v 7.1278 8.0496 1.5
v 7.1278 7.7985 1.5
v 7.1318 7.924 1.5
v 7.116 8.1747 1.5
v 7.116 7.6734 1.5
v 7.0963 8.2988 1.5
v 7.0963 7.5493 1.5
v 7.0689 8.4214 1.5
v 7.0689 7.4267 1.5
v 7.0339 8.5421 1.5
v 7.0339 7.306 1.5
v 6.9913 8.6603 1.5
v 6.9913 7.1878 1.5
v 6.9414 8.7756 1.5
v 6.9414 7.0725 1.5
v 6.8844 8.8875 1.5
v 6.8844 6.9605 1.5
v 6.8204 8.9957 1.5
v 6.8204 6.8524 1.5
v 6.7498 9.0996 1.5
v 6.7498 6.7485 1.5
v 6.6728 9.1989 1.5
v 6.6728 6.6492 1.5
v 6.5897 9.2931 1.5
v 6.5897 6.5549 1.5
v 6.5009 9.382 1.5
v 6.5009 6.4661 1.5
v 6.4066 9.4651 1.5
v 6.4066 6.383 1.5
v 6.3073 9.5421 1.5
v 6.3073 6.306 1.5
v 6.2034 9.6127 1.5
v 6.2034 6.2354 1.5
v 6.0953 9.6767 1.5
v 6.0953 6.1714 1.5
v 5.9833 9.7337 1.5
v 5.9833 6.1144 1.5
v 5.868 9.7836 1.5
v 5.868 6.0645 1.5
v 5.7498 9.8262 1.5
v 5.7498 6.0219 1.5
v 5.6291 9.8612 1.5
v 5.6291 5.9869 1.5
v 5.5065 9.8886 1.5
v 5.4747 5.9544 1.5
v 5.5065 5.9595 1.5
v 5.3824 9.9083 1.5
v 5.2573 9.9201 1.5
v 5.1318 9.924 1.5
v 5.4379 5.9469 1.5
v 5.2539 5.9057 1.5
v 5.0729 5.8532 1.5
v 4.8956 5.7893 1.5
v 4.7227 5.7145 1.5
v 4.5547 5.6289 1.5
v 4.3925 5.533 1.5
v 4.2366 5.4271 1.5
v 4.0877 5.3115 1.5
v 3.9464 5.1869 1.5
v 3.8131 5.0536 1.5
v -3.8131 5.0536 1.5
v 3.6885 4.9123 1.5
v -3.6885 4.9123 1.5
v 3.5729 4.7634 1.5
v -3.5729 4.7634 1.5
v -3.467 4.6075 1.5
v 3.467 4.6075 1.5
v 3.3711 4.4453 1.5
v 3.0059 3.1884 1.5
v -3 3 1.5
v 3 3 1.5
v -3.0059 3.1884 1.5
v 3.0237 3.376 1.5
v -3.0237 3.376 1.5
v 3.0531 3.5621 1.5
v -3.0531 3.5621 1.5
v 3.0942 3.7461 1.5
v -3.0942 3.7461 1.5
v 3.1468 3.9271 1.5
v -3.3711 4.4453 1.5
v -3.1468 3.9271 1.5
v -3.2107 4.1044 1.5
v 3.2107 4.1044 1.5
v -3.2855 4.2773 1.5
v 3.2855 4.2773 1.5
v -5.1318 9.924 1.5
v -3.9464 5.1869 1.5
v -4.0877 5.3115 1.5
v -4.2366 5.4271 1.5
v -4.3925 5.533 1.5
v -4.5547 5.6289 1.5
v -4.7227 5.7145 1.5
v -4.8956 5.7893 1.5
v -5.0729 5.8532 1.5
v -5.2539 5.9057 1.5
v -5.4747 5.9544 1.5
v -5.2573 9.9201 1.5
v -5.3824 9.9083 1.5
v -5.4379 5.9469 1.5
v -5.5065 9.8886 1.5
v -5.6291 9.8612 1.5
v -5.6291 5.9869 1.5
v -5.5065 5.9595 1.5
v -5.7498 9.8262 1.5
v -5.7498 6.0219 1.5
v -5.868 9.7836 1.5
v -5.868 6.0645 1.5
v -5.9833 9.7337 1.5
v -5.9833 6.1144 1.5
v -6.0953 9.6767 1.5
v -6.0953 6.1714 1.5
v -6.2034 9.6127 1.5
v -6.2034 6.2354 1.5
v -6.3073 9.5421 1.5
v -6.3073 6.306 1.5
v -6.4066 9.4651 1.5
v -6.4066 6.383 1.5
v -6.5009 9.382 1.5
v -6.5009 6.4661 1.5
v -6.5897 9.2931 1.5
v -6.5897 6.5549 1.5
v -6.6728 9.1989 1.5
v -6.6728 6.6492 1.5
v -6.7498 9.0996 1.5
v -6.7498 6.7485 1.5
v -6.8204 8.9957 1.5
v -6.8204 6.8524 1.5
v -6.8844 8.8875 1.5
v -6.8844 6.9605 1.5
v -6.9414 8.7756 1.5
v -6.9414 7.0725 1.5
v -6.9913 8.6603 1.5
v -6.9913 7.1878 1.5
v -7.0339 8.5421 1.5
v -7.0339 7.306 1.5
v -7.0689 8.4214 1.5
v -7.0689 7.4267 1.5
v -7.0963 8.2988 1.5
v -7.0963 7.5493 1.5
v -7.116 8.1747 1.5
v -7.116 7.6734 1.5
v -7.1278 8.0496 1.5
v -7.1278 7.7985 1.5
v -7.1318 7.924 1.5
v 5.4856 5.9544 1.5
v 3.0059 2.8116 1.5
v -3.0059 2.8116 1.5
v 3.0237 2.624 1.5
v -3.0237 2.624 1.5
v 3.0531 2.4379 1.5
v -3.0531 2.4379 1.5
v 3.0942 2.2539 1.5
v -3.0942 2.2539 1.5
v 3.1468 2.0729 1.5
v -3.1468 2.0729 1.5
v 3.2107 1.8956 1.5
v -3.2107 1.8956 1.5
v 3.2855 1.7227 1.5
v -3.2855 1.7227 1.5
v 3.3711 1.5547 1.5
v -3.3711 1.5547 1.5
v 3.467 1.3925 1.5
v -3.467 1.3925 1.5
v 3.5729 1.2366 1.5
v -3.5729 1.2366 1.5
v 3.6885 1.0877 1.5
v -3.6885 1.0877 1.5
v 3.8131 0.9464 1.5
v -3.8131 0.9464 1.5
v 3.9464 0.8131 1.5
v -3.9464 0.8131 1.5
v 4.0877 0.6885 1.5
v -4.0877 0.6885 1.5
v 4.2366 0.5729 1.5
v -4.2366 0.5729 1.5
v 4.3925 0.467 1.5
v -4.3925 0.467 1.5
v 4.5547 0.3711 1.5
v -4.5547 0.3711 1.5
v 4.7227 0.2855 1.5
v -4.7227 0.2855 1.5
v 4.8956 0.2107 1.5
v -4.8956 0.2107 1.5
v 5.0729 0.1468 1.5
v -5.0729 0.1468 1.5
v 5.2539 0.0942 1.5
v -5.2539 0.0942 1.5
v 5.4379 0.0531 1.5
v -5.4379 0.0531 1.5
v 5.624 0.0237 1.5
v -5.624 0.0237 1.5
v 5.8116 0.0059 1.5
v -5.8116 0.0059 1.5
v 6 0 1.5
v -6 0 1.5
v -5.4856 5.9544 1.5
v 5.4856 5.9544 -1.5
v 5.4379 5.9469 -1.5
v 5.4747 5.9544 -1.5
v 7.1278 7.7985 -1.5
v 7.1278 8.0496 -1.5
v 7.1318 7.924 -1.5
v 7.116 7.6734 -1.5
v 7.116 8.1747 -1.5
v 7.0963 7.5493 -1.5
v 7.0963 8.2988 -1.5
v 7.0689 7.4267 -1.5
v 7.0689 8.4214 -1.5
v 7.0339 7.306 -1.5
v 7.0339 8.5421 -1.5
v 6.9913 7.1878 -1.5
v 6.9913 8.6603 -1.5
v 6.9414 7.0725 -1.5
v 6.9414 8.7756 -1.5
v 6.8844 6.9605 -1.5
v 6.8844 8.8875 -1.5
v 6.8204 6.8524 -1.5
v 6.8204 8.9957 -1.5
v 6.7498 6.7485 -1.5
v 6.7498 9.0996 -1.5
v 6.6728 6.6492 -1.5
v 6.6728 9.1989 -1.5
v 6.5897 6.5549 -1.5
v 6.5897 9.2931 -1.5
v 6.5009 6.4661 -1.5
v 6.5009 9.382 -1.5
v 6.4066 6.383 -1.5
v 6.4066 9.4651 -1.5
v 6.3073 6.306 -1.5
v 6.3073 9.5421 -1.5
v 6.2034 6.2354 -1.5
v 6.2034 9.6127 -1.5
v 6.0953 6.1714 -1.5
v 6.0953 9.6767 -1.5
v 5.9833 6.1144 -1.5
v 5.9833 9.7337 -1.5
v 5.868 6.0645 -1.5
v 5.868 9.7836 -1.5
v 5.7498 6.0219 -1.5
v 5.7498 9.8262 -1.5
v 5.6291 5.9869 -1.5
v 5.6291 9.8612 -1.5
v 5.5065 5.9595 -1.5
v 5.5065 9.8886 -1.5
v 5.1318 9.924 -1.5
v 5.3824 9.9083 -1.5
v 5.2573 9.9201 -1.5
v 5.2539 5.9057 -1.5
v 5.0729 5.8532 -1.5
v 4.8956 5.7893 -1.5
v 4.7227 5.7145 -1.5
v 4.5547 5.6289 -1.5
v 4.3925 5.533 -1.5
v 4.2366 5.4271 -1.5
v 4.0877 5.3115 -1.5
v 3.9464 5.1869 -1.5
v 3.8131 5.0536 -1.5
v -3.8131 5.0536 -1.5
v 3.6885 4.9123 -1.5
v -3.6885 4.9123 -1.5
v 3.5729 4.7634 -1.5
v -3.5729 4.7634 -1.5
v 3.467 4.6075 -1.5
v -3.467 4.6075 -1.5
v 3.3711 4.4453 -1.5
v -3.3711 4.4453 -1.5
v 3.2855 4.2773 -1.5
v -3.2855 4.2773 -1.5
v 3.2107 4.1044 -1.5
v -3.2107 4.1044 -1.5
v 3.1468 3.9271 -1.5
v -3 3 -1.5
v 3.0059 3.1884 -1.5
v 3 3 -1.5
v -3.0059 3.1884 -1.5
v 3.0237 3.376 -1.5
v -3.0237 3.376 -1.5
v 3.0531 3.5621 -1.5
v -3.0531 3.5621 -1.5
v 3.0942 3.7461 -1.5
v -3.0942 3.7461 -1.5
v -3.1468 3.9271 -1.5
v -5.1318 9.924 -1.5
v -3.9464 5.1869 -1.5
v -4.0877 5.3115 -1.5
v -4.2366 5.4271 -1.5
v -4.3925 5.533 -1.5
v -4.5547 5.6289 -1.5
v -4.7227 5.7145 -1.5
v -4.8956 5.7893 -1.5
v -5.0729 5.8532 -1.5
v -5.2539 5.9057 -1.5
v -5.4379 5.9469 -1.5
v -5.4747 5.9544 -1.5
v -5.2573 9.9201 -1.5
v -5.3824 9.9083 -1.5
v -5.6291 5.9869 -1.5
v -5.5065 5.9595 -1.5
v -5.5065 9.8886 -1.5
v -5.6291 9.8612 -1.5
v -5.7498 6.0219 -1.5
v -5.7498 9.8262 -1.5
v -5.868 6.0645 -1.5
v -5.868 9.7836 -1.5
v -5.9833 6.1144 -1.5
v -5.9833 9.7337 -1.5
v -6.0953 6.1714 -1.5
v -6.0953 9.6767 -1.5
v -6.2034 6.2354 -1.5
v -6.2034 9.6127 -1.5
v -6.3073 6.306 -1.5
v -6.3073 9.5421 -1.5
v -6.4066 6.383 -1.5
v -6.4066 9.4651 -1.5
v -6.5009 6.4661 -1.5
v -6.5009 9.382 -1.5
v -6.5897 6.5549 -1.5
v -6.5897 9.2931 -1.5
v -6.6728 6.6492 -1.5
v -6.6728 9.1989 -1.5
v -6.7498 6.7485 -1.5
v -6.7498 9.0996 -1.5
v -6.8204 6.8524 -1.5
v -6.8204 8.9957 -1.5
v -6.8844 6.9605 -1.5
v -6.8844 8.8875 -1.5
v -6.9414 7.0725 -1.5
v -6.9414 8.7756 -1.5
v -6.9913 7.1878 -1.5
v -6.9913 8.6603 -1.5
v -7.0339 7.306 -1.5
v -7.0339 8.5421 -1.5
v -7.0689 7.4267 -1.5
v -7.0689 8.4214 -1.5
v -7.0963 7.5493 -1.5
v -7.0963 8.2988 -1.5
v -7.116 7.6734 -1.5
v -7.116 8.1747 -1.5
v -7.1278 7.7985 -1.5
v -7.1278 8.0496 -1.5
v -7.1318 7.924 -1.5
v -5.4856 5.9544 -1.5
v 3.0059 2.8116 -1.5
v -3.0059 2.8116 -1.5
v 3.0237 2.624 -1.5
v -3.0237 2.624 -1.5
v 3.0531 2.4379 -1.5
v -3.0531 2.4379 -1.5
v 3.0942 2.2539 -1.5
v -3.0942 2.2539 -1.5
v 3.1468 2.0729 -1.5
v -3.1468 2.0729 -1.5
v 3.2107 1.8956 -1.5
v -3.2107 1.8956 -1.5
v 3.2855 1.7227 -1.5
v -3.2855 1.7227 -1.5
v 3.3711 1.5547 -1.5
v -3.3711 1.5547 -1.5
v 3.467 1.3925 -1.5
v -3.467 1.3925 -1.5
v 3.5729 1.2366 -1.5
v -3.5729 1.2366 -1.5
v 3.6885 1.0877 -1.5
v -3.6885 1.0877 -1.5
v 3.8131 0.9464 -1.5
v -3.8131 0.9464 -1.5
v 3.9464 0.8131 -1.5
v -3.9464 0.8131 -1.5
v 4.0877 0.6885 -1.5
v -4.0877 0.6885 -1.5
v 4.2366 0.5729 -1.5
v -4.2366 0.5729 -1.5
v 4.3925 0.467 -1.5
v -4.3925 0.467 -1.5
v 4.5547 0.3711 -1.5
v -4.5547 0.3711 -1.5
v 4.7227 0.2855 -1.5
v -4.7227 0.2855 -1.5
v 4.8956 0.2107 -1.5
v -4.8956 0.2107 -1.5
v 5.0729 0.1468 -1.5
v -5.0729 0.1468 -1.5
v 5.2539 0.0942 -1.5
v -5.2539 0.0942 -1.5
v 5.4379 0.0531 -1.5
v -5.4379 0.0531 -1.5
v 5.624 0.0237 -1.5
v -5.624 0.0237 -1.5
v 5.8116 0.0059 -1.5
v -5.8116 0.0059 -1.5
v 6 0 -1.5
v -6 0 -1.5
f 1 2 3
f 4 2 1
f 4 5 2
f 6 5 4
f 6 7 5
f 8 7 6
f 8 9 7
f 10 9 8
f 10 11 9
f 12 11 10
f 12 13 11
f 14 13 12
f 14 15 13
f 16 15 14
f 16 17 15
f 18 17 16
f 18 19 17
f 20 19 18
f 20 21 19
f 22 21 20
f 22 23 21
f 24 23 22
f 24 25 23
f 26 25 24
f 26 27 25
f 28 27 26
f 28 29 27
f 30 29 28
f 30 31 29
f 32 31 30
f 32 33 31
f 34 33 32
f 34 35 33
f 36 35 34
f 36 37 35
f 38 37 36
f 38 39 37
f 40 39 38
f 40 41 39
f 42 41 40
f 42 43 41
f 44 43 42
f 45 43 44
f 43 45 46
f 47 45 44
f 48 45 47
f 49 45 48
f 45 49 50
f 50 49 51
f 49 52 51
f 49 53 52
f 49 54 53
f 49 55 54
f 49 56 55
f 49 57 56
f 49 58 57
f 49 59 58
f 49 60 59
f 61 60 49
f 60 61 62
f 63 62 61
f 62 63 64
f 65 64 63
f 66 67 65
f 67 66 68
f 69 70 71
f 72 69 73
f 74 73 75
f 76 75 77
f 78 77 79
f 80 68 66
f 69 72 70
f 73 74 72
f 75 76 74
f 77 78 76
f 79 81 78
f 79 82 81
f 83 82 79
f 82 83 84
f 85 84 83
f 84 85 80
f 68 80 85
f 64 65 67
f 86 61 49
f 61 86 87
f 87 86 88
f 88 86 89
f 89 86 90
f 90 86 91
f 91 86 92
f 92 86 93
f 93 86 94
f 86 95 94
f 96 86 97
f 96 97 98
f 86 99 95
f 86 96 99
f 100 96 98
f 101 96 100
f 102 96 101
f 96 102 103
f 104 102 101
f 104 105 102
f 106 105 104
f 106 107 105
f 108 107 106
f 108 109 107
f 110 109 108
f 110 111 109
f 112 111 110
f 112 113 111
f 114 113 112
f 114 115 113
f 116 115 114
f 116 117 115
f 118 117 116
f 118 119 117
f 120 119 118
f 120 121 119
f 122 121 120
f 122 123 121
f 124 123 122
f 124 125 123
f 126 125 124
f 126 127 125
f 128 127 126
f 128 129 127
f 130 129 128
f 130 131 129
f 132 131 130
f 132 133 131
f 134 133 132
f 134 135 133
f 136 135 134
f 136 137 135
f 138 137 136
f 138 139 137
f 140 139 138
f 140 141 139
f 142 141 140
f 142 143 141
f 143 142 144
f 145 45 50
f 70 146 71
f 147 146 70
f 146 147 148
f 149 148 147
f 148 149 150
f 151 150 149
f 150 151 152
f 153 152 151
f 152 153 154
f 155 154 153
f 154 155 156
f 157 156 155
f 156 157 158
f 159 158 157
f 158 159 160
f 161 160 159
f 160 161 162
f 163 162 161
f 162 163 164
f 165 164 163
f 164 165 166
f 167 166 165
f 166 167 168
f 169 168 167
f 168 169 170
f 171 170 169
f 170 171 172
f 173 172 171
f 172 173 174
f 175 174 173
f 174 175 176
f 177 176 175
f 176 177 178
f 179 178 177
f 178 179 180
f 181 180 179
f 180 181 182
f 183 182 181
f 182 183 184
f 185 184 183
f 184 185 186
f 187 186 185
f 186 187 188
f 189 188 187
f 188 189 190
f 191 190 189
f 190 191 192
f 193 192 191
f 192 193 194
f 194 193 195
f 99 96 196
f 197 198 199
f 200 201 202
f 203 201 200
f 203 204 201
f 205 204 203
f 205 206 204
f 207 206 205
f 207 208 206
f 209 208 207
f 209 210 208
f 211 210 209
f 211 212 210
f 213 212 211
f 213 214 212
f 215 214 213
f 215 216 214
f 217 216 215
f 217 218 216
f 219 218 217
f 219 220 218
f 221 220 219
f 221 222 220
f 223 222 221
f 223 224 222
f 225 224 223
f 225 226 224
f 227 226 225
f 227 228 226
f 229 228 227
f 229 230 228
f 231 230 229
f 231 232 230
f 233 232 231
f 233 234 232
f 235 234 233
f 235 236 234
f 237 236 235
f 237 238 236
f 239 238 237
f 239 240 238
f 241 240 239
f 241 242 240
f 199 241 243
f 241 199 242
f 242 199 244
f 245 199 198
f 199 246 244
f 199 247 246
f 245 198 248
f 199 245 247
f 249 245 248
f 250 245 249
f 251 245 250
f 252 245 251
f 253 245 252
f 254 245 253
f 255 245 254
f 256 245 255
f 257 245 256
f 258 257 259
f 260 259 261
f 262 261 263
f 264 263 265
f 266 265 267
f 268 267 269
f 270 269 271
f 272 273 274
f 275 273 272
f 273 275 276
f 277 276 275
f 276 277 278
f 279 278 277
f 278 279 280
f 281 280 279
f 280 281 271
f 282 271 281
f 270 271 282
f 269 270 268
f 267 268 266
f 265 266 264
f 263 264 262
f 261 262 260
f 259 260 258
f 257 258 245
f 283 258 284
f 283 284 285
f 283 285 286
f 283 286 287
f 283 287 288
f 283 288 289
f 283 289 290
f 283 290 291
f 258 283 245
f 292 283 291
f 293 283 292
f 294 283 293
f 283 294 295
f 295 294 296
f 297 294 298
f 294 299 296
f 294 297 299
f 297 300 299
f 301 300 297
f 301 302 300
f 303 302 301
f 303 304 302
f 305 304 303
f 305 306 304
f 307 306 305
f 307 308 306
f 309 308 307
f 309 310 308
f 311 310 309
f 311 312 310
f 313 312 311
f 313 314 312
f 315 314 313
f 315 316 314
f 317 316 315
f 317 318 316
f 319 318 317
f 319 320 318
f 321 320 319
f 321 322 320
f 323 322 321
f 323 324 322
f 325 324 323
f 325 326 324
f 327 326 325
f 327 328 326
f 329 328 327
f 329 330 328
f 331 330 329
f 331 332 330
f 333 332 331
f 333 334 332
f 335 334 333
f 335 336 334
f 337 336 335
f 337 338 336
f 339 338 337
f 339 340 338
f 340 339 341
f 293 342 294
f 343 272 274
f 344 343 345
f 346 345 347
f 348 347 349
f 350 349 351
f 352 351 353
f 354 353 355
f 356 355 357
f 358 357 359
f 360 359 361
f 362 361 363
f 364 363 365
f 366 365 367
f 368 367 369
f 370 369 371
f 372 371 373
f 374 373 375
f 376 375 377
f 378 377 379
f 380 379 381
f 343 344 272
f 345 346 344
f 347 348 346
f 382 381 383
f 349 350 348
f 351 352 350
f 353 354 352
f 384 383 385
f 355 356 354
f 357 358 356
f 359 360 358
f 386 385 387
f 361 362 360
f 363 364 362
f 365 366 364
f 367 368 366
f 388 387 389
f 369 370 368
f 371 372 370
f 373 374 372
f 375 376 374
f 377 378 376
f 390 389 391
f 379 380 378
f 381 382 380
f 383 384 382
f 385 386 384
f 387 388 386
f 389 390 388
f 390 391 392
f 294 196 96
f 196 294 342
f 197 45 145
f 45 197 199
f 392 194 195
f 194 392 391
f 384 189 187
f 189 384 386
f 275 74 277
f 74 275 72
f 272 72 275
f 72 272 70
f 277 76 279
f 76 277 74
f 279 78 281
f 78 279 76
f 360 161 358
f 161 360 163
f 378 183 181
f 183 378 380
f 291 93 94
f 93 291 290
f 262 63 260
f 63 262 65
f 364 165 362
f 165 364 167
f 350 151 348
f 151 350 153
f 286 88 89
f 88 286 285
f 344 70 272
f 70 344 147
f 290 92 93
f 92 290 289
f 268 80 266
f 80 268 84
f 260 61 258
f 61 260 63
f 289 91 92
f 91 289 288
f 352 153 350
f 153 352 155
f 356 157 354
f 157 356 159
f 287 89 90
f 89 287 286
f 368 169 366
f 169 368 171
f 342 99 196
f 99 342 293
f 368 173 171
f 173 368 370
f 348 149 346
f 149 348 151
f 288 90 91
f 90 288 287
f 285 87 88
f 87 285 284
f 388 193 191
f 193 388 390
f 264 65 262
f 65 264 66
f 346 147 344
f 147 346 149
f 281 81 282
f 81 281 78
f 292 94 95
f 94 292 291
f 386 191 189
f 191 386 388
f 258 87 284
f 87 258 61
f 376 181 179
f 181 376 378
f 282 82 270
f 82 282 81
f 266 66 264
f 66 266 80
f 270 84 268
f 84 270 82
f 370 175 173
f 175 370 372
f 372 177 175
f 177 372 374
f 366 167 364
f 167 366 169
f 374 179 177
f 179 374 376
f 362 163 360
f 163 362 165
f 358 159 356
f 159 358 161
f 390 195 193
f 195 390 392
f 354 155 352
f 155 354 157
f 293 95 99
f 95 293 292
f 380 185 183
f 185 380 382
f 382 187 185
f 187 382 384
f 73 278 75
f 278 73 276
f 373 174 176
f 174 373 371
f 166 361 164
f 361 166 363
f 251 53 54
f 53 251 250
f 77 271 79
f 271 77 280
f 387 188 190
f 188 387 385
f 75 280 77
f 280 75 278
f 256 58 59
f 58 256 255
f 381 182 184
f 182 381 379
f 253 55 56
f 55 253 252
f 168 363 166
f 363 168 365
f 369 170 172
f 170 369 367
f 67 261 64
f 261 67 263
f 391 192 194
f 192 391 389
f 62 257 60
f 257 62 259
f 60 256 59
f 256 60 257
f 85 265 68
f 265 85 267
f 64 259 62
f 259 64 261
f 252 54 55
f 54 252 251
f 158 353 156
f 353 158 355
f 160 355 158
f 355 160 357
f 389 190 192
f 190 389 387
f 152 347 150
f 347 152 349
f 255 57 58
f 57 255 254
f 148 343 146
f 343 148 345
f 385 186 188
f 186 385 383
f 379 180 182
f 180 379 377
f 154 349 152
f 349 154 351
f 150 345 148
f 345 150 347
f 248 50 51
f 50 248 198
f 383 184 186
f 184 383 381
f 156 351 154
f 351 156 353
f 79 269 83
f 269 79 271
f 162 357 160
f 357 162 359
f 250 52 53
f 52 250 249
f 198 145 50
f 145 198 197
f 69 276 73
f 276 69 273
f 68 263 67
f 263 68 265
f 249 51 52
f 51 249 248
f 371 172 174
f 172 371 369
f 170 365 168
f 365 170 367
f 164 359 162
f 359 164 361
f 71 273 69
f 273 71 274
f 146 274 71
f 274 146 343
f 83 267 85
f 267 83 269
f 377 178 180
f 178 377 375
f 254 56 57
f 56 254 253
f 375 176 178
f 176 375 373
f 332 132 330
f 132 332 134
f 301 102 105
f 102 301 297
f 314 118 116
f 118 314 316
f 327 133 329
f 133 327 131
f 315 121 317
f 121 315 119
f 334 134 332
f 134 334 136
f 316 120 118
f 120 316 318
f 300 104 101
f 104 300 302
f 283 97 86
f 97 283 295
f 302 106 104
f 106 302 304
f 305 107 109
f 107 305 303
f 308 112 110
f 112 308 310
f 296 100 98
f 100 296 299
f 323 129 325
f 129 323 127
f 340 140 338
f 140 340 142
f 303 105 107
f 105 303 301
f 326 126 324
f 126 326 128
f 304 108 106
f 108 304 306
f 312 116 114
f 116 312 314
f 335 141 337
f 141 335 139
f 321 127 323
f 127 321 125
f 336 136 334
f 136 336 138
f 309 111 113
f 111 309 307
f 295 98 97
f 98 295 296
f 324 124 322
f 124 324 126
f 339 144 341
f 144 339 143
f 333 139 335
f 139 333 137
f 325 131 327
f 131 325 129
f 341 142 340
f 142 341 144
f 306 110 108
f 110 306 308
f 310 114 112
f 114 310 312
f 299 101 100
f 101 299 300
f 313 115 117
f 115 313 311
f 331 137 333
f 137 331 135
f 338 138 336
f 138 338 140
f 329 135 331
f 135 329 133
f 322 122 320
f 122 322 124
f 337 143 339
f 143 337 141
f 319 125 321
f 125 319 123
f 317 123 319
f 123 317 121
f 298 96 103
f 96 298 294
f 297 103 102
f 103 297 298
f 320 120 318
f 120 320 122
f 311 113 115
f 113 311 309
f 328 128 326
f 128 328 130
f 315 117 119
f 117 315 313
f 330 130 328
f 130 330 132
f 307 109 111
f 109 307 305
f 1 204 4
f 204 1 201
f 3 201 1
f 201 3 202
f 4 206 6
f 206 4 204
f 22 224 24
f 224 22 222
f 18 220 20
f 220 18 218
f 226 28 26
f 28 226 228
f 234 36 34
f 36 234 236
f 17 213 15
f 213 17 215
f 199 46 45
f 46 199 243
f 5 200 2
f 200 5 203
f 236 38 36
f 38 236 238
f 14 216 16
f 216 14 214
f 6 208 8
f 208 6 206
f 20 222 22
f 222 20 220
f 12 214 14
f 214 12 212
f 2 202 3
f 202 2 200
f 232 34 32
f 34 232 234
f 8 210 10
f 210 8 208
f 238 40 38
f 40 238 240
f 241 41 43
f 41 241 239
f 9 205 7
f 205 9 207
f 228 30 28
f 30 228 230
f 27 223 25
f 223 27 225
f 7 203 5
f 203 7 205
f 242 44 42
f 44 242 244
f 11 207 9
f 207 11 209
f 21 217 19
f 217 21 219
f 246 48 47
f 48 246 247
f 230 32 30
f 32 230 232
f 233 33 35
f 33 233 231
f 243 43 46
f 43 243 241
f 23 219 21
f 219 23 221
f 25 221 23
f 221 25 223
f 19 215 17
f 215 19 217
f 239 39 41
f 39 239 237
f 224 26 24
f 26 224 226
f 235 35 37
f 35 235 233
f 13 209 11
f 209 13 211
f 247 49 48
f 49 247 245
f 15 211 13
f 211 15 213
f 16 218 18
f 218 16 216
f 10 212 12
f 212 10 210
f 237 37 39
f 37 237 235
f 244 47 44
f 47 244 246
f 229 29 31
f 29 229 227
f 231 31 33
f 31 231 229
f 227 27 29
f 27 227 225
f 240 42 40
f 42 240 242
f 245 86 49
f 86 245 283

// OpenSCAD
// file: config.scad
$fn = 100;
nothing = 0.01;
material_z = 3;

body_x = 300;
body_y = 80;

candle_diameter = 40;
candle_height = 15;

hole_radius = candle_diameter / 2;
hole_count = 5;
//hole_layer_count = candle_height / material_z;
hole_layer_count = 3;

all_holes_x = hole_count*hole_radius*2;
spacing_count = hole_count + 1;
spacing_x = (body_x - all_holes_x) / spacing_count;
// main file
include <config.scad>;

/**
 * This module generates a puzzle nose
 */
module puzzle_nose(r1=5, r2=3, width=20, angle=45)
{
    // Upper and lower circle touching point
    px = -width/2 + cos(angle)*r1;
    py = r1 + sin(angle)*r1;

    // Upper circle center coordinates
    x2 = px + cos(angle)*r2;
    y2 = py + sin(angle)*r2;

    // Upper circles
    translate([x2, y2, 0])
    cylinder(r=r2, h=material_z, center=true);
    translate([-x2, y2, 0])
    cylinder(r=r2, h=material_z, center=true);

    // Outer nose edge
    translate([0, y2, 0])
    cube([
        2*abs(x2),
        2*r2,
        material_z
        ], center=true);

    difference()
    {
        // Puzzle body
        translate([0, py/2, 0])
        cube([
            width,
            py,
            material_z
            ], center=true);
        
        // Lower circles
        translate([-width/2, r1, 0])
        cylinder(r=r1, h=material_z+2*nothing, center=true);
        translate([width/2, r1, 0])
        cylinder(r=r1, h=material_z+2*nothing, center=true);
    }
}

puzzle_nose(r1=3, r2=2, width=12, angle=80);
